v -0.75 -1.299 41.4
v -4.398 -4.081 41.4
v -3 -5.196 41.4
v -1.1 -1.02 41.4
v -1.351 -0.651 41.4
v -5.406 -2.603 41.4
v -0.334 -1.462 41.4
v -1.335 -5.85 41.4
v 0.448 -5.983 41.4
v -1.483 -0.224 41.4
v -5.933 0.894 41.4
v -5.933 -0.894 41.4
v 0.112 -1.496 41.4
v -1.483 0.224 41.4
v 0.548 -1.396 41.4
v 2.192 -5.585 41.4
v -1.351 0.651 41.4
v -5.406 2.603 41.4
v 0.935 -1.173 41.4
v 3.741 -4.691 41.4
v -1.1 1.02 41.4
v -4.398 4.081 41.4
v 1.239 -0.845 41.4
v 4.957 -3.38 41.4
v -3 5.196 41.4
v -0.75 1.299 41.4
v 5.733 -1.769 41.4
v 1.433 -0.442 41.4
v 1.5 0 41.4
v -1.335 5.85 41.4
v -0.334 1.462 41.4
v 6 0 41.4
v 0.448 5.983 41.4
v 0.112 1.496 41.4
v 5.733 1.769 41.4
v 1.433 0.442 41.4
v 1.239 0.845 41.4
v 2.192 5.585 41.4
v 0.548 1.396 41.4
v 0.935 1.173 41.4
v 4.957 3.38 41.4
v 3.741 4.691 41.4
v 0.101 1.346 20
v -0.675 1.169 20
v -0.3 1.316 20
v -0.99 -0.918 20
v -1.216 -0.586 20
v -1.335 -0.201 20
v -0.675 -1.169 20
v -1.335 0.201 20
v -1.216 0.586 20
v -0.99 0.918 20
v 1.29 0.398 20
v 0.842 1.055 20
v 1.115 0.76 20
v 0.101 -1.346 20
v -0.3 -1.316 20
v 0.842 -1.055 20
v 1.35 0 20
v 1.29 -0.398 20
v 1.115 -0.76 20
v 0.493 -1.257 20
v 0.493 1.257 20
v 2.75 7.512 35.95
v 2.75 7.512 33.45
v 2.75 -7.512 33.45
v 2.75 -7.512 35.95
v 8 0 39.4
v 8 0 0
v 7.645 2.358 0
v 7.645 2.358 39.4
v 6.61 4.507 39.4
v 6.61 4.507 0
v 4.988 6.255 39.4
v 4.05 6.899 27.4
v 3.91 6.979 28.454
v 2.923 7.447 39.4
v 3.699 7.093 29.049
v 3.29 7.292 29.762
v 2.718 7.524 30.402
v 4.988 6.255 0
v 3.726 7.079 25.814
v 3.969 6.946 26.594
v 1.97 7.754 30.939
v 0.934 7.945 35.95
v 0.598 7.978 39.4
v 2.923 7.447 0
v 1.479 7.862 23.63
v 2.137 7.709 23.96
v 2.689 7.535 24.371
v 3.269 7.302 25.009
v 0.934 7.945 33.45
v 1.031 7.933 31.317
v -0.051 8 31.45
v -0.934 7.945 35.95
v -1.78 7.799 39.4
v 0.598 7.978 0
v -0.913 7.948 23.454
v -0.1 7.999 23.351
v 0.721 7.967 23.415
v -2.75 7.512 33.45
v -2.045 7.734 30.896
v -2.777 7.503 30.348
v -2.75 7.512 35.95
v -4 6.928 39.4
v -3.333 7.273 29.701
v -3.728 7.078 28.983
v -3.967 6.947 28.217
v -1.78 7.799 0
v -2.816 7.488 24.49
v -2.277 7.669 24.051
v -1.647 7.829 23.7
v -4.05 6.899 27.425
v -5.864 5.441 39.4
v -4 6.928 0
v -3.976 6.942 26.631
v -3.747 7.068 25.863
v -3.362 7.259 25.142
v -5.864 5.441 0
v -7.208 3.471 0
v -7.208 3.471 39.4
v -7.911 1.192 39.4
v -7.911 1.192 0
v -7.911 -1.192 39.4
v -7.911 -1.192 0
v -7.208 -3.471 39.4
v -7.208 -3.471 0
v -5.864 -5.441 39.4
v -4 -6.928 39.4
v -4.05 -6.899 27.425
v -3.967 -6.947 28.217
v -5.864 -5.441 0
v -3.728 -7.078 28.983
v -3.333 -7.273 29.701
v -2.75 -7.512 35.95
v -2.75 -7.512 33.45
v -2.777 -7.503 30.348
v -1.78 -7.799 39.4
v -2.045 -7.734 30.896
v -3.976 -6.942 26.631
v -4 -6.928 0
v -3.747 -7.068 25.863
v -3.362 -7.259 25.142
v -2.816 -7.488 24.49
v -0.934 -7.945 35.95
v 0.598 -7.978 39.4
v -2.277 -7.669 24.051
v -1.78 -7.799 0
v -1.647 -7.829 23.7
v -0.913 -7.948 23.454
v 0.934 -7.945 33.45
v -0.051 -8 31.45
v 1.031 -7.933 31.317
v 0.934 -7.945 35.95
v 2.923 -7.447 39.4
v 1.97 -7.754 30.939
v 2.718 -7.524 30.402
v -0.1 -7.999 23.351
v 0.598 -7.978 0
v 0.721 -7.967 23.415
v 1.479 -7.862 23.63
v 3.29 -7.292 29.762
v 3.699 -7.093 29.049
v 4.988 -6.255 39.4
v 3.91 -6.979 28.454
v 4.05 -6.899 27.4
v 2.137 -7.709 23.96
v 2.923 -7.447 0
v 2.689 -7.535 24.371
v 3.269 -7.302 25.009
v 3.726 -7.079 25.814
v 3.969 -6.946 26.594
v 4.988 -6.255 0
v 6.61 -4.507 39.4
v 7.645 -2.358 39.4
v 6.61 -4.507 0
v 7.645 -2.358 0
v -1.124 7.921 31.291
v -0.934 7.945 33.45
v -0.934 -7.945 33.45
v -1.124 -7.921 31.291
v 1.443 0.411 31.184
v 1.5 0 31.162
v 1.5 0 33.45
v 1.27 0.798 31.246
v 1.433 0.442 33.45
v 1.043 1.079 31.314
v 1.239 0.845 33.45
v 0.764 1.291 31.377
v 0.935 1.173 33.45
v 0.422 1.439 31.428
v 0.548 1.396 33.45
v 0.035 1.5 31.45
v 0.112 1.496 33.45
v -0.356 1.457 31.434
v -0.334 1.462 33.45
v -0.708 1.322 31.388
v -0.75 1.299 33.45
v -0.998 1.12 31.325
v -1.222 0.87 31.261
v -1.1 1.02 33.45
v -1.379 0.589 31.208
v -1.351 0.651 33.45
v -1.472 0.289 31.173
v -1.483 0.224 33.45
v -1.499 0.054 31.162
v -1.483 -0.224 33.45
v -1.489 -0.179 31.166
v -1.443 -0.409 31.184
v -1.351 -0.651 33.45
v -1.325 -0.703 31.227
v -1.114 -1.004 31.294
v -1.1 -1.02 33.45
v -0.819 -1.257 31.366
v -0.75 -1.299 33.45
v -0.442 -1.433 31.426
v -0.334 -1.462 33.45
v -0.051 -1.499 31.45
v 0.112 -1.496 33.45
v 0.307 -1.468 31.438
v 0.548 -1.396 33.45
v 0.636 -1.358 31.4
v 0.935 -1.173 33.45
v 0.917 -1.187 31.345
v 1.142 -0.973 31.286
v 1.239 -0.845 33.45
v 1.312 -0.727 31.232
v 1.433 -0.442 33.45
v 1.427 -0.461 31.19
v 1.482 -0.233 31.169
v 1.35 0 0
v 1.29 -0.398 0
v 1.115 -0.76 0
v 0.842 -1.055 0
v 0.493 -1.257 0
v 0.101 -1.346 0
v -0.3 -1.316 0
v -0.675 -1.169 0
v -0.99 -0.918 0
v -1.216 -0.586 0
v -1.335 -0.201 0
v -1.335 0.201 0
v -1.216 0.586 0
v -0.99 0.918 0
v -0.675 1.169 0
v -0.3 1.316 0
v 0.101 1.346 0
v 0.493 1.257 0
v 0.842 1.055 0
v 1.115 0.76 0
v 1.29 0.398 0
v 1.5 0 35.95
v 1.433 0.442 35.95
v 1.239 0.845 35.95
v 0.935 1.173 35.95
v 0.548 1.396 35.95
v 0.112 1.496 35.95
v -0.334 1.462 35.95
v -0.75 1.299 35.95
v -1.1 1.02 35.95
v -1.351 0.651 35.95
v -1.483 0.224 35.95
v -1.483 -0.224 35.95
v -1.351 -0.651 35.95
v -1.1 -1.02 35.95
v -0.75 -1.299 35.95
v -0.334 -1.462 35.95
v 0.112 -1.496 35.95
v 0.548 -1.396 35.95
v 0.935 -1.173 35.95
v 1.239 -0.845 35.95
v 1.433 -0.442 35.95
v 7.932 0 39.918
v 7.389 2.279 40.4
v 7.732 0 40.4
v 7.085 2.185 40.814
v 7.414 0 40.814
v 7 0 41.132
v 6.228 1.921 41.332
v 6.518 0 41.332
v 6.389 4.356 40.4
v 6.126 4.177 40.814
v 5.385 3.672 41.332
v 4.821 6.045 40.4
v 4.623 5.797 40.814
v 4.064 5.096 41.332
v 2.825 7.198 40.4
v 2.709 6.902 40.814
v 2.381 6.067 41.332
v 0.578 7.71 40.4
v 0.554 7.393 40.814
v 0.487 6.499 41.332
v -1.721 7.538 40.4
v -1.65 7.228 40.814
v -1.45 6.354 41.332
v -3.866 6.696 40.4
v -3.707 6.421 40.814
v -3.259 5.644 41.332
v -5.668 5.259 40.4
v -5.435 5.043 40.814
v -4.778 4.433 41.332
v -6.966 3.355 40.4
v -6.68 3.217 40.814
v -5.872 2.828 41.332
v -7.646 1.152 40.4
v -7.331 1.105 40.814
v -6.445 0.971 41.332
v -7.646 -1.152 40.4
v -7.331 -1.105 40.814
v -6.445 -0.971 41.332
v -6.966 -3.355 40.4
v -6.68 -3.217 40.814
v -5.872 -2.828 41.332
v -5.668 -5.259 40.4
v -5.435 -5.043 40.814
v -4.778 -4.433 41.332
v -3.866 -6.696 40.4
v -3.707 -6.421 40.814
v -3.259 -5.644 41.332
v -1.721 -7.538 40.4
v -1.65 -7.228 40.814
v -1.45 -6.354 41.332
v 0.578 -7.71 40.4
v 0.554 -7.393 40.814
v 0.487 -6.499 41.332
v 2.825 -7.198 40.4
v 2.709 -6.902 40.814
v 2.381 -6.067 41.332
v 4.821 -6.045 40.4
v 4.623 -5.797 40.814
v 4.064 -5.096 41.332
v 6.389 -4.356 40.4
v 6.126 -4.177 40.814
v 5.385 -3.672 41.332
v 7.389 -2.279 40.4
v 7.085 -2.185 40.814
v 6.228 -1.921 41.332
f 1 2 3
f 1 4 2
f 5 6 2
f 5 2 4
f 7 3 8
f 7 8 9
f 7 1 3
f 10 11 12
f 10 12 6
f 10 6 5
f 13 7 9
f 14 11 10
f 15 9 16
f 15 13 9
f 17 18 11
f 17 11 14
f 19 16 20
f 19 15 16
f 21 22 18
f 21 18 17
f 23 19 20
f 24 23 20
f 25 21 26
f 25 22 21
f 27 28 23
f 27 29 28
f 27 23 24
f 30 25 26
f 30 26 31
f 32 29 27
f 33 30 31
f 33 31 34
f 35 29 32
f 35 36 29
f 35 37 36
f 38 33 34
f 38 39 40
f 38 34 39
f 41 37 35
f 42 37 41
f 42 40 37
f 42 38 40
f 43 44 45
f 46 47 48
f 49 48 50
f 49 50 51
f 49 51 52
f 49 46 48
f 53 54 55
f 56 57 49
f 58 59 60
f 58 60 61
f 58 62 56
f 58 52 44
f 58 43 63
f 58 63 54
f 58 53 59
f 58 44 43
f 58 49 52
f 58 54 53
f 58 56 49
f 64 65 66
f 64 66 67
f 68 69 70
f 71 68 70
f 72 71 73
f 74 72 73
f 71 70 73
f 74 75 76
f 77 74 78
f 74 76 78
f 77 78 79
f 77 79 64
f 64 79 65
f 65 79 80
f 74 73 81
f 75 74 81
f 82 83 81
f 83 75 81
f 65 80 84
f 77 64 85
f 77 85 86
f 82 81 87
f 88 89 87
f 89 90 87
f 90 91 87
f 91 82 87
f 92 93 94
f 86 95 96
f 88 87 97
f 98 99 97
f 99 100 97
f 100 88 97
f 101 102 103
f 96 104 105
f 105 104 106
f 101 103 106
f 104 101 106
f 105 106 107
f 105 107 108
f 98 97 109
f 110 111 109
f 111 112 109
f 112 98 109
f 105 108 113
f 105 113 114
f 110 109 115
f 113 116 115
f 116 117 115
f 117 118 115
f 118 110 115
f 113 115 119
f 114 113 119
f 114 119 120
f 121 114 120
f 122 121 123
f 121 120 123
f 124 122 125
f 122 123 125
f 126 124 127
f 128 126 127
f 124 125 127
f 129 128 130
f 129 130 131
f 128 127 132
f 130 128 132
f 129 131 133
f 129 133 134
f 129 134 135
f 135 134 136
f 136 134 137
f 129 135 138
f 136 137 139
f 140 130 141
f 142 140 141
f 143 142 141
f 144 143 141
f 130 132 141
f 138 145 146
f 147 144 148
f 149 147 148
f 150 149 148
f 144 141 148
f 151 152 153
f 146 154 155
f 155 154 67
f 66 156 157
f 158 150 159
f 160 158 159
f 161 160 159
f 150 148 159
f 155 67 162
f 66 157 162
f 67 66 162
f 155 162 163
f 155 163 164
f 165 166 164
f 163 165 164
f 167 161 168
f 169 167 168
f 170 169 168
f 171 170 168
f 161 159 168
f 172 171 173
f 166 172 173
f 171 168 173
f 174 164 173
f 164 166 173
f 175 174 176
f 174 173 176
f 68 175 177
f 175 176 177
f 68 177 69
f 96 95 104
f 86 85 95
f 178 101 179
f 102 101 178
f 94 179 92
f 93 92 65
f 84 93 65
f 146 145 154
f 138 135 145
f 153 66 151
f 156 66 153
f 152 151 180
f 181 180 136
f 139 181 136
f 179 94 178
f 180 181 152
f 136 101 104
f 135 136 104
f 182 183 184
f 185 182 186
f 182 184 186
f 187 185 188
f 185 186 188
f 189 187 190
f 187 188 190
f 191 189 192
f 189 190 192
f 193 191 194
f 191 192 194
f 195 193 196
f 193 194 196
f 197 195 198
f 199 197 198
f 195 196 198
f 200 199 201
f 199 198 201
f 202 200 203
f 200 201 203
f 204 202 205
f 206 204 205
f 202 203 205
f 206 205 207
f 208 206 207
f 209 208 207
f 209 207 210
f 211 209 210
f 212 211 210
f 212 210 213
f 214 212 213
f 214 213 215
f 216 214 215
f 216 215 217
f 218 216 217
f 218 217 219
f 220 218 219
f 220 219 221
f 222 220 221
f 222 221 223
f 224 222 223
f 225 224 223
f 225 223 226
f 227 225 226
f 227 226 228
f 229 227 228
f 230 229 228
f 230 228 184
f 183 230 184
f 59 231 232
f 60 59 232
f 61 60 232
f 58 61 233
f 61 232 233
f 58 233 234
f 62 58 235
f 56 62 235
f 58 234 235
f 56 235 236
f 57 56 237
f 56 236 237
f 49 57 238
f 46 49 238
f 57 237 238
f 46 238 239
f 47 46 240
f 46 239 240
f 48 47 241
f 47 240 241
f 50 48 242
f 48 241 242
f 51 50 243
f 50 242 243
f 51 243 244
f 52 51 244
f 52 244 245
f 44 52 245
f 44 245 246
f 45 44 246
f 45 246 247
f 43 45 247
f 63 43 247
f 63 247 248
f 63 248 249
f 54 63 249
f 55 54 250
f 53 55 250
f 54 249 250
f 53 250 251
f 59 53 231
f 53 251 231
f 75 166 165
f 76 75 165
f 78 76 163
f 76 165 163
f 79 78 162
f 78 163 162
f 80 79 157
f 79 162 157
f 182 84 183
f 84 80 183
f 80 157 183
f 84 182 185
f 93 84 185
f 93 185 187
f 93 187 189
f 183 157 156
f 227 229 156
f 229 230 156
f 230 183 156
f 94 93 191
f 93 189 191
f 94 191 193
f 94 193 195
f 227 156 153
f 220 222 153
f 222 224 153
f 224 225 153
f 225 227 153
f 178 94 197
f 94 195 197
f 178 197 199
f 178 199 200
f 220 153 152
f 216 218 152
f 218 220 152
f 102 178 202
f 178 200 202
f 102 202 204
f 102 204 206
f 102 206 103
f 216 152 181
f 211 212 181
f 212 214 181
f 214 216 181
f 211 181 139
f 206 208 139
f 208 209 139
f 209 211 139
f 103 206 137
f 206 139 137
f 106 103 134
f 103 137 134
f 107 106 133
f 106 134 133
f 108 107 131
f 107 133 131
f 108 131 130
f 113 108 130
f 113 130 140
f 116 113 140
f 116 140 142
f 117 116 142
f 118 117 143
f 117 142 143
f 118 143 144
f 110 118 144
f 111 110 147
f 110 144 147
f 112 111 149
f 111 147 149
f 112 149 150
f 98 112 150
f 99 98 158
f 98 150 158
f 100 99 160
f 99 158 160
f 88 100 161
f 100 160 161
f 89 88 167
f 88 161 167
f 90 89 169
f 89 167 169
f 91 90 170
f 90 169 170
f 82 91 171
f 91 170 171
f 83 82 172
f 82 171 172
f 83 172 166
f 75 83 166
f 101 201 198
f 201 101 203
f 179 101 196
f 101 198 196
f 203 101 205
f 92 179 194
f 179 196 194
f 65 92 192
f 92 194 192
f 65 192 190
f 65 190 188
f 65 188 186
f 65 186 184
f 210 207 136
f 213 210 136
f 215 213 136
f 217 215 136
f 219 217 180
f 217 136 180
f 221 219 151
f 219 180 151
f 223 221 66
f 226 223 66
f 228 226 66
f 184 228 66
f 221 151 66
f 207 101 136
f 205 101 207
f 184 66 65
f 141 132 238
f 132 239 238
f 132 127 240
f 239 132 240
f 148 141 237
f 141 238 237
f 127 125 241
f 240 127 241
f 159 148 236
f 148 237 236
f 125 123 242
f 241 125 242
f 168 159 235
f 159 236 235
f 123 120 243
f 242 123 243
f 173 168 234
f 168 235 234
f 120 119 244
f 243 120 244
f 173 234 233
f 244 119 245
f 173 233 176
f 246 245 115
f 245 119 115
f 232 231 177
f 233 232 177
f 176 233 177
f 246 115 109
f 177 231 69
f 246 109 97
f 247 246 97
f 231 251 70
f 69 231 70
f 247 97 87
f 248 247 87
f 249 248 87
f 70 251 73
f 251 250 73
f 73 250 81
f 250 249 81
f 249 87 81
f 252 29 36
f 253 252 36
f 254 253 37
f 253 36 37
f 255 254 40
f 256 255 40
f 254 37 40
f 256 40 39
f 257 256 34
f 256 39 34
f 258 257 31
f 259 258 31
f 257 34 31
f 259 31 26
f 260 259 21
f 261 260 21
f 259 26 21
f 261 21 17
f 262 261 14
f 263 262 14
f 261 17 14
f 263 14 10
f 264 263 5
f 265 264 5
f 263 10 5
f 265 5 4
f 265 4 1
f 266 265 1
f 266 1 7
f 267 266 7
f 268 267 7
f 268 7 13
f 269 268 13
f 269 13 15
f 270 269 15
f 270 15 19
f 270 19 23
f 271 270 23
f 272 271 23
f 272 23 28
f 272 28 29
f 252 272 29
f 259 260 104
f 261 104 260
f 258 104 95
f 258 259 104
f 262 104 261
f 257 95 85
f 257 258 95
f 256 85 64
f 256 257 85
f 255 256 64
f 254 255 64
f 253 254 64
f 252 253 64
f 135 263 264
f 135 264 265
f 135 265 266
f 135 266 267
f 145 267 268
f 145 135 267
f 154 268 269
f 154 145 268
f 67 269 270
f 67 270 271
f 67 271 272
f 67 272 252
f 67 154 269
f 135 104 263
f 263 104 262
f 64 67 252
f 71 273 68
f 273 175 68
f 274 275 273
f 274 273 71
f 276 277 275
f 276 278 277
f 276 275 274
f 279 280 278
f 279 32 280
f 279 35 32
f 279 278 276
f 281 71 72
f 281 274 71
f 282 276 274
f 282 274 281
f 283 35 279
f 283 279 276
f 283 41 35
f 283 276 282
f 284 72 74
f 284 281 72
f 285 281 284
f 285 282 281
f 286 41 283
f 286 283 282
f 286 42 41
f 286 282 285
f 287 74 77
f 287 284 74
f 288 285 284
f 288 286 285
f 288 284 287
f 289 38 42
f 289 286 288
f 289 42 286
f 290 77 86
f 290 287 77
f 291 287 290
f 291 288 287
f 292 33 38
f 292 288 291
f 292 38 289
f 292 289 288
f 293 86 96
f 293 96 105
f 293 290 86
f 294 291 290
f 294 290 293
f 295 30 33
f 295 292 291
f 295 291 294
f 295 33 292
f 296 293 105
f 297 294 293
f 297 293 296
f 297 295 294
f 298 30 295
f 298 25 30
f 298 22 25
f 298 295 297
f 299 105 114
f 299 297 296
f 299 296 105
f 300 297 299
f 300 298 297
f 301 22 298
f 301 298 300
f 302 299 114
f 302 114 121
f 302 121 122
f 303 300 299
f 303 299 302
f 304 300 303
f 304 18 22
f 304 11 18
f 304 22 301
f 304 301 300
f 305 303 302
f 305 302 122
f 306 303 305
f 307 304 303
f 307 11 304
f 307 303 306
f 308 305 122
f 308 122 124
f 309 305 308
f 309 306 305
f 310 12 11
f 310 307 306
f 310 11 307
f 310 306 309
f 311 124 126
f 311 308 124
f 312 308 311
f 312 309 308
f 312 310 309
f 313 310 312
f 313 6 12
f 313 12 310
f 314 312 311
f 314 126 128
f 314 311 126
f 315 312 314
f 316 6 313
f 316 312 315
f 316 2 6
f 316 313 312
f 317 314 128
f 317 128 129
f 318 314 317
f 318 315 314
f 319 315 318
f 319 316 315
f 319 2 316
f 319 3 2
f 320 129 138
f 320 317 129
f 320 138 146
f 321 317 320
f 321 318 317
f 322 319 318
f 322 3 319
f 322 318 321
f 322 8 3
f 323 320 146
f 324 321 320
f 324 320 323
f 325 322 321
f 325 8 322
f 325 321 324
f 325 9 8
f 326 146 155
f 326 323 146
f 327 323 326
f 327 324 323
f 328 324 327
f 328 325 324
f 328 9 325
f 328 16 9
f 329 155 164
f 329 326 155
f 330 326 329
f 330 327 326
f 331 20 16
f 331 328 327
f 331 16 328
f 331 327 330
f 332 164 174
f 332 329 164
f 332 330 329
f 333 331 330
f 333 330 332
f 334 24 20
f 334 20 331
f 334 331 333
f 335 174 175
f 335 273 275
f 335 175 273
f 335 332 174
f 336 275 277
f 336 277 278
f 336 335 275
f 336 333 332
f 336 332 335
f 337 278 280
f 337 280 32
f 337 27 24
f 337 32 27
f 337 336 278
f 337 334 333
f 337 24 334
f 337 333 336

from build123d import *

# Parameters (mm, degrees)
F0_R     = 8
F1_DEPTH = 41.4
F2_R     = 4.05
F2_W     = 5.5
F2_H     = 2.5
F3_DEPTH = 12.5
F4_R     = 1.5
F5_DEPTH = 16
F6_R     = 1.35
F7_DEPTH = 20
F8_R     = 2


with BuildPart() as f1:
    # F0 (on Top) → F1 (new body)
    with BuildSketch(Plane.XY):
        Circle(F0_R)
    extrude(amount=F1_DEPTH)

    # F2 (on Front) → F3 (cut, symmetric)
    with BuildSketch(Plane.XZ):
        with Locations((0, 27.4)):
            Circle(F2_R)
        with Locations((0, 34.7)):
            Rectangle(F2_W, F2_H)
    extrude(amount=F3_DEPTH, both=True, mode=Mode.SUBTRACT)

    # F4 (on face) → F5 (cut)
    with BuildSketch(Plane.XY.offset(41.4)):
        Circle(F4_R)
    extrude(amount=-F5_DEPTH, mode=Mode.SUBTRACT)

    # F6 (on face) → F7 (cut)
    with BuildSketch(Plane(origin=(0, 0, 0), x_dir=(1, 0, 0), z_dir=(0, 0, -1))):
        Circle(F6_R)
    extrude(amount=-F7_DEPTH, mode=Mode.SUBTRACT)

    # F8
    f8_edges = [f1.edges().sort_by_distance(p)[0] for p in [
        (-8, 0, 41.4),
    ]]
    fillet(f8_edges, radius=F8_R)


solid = f1.part
